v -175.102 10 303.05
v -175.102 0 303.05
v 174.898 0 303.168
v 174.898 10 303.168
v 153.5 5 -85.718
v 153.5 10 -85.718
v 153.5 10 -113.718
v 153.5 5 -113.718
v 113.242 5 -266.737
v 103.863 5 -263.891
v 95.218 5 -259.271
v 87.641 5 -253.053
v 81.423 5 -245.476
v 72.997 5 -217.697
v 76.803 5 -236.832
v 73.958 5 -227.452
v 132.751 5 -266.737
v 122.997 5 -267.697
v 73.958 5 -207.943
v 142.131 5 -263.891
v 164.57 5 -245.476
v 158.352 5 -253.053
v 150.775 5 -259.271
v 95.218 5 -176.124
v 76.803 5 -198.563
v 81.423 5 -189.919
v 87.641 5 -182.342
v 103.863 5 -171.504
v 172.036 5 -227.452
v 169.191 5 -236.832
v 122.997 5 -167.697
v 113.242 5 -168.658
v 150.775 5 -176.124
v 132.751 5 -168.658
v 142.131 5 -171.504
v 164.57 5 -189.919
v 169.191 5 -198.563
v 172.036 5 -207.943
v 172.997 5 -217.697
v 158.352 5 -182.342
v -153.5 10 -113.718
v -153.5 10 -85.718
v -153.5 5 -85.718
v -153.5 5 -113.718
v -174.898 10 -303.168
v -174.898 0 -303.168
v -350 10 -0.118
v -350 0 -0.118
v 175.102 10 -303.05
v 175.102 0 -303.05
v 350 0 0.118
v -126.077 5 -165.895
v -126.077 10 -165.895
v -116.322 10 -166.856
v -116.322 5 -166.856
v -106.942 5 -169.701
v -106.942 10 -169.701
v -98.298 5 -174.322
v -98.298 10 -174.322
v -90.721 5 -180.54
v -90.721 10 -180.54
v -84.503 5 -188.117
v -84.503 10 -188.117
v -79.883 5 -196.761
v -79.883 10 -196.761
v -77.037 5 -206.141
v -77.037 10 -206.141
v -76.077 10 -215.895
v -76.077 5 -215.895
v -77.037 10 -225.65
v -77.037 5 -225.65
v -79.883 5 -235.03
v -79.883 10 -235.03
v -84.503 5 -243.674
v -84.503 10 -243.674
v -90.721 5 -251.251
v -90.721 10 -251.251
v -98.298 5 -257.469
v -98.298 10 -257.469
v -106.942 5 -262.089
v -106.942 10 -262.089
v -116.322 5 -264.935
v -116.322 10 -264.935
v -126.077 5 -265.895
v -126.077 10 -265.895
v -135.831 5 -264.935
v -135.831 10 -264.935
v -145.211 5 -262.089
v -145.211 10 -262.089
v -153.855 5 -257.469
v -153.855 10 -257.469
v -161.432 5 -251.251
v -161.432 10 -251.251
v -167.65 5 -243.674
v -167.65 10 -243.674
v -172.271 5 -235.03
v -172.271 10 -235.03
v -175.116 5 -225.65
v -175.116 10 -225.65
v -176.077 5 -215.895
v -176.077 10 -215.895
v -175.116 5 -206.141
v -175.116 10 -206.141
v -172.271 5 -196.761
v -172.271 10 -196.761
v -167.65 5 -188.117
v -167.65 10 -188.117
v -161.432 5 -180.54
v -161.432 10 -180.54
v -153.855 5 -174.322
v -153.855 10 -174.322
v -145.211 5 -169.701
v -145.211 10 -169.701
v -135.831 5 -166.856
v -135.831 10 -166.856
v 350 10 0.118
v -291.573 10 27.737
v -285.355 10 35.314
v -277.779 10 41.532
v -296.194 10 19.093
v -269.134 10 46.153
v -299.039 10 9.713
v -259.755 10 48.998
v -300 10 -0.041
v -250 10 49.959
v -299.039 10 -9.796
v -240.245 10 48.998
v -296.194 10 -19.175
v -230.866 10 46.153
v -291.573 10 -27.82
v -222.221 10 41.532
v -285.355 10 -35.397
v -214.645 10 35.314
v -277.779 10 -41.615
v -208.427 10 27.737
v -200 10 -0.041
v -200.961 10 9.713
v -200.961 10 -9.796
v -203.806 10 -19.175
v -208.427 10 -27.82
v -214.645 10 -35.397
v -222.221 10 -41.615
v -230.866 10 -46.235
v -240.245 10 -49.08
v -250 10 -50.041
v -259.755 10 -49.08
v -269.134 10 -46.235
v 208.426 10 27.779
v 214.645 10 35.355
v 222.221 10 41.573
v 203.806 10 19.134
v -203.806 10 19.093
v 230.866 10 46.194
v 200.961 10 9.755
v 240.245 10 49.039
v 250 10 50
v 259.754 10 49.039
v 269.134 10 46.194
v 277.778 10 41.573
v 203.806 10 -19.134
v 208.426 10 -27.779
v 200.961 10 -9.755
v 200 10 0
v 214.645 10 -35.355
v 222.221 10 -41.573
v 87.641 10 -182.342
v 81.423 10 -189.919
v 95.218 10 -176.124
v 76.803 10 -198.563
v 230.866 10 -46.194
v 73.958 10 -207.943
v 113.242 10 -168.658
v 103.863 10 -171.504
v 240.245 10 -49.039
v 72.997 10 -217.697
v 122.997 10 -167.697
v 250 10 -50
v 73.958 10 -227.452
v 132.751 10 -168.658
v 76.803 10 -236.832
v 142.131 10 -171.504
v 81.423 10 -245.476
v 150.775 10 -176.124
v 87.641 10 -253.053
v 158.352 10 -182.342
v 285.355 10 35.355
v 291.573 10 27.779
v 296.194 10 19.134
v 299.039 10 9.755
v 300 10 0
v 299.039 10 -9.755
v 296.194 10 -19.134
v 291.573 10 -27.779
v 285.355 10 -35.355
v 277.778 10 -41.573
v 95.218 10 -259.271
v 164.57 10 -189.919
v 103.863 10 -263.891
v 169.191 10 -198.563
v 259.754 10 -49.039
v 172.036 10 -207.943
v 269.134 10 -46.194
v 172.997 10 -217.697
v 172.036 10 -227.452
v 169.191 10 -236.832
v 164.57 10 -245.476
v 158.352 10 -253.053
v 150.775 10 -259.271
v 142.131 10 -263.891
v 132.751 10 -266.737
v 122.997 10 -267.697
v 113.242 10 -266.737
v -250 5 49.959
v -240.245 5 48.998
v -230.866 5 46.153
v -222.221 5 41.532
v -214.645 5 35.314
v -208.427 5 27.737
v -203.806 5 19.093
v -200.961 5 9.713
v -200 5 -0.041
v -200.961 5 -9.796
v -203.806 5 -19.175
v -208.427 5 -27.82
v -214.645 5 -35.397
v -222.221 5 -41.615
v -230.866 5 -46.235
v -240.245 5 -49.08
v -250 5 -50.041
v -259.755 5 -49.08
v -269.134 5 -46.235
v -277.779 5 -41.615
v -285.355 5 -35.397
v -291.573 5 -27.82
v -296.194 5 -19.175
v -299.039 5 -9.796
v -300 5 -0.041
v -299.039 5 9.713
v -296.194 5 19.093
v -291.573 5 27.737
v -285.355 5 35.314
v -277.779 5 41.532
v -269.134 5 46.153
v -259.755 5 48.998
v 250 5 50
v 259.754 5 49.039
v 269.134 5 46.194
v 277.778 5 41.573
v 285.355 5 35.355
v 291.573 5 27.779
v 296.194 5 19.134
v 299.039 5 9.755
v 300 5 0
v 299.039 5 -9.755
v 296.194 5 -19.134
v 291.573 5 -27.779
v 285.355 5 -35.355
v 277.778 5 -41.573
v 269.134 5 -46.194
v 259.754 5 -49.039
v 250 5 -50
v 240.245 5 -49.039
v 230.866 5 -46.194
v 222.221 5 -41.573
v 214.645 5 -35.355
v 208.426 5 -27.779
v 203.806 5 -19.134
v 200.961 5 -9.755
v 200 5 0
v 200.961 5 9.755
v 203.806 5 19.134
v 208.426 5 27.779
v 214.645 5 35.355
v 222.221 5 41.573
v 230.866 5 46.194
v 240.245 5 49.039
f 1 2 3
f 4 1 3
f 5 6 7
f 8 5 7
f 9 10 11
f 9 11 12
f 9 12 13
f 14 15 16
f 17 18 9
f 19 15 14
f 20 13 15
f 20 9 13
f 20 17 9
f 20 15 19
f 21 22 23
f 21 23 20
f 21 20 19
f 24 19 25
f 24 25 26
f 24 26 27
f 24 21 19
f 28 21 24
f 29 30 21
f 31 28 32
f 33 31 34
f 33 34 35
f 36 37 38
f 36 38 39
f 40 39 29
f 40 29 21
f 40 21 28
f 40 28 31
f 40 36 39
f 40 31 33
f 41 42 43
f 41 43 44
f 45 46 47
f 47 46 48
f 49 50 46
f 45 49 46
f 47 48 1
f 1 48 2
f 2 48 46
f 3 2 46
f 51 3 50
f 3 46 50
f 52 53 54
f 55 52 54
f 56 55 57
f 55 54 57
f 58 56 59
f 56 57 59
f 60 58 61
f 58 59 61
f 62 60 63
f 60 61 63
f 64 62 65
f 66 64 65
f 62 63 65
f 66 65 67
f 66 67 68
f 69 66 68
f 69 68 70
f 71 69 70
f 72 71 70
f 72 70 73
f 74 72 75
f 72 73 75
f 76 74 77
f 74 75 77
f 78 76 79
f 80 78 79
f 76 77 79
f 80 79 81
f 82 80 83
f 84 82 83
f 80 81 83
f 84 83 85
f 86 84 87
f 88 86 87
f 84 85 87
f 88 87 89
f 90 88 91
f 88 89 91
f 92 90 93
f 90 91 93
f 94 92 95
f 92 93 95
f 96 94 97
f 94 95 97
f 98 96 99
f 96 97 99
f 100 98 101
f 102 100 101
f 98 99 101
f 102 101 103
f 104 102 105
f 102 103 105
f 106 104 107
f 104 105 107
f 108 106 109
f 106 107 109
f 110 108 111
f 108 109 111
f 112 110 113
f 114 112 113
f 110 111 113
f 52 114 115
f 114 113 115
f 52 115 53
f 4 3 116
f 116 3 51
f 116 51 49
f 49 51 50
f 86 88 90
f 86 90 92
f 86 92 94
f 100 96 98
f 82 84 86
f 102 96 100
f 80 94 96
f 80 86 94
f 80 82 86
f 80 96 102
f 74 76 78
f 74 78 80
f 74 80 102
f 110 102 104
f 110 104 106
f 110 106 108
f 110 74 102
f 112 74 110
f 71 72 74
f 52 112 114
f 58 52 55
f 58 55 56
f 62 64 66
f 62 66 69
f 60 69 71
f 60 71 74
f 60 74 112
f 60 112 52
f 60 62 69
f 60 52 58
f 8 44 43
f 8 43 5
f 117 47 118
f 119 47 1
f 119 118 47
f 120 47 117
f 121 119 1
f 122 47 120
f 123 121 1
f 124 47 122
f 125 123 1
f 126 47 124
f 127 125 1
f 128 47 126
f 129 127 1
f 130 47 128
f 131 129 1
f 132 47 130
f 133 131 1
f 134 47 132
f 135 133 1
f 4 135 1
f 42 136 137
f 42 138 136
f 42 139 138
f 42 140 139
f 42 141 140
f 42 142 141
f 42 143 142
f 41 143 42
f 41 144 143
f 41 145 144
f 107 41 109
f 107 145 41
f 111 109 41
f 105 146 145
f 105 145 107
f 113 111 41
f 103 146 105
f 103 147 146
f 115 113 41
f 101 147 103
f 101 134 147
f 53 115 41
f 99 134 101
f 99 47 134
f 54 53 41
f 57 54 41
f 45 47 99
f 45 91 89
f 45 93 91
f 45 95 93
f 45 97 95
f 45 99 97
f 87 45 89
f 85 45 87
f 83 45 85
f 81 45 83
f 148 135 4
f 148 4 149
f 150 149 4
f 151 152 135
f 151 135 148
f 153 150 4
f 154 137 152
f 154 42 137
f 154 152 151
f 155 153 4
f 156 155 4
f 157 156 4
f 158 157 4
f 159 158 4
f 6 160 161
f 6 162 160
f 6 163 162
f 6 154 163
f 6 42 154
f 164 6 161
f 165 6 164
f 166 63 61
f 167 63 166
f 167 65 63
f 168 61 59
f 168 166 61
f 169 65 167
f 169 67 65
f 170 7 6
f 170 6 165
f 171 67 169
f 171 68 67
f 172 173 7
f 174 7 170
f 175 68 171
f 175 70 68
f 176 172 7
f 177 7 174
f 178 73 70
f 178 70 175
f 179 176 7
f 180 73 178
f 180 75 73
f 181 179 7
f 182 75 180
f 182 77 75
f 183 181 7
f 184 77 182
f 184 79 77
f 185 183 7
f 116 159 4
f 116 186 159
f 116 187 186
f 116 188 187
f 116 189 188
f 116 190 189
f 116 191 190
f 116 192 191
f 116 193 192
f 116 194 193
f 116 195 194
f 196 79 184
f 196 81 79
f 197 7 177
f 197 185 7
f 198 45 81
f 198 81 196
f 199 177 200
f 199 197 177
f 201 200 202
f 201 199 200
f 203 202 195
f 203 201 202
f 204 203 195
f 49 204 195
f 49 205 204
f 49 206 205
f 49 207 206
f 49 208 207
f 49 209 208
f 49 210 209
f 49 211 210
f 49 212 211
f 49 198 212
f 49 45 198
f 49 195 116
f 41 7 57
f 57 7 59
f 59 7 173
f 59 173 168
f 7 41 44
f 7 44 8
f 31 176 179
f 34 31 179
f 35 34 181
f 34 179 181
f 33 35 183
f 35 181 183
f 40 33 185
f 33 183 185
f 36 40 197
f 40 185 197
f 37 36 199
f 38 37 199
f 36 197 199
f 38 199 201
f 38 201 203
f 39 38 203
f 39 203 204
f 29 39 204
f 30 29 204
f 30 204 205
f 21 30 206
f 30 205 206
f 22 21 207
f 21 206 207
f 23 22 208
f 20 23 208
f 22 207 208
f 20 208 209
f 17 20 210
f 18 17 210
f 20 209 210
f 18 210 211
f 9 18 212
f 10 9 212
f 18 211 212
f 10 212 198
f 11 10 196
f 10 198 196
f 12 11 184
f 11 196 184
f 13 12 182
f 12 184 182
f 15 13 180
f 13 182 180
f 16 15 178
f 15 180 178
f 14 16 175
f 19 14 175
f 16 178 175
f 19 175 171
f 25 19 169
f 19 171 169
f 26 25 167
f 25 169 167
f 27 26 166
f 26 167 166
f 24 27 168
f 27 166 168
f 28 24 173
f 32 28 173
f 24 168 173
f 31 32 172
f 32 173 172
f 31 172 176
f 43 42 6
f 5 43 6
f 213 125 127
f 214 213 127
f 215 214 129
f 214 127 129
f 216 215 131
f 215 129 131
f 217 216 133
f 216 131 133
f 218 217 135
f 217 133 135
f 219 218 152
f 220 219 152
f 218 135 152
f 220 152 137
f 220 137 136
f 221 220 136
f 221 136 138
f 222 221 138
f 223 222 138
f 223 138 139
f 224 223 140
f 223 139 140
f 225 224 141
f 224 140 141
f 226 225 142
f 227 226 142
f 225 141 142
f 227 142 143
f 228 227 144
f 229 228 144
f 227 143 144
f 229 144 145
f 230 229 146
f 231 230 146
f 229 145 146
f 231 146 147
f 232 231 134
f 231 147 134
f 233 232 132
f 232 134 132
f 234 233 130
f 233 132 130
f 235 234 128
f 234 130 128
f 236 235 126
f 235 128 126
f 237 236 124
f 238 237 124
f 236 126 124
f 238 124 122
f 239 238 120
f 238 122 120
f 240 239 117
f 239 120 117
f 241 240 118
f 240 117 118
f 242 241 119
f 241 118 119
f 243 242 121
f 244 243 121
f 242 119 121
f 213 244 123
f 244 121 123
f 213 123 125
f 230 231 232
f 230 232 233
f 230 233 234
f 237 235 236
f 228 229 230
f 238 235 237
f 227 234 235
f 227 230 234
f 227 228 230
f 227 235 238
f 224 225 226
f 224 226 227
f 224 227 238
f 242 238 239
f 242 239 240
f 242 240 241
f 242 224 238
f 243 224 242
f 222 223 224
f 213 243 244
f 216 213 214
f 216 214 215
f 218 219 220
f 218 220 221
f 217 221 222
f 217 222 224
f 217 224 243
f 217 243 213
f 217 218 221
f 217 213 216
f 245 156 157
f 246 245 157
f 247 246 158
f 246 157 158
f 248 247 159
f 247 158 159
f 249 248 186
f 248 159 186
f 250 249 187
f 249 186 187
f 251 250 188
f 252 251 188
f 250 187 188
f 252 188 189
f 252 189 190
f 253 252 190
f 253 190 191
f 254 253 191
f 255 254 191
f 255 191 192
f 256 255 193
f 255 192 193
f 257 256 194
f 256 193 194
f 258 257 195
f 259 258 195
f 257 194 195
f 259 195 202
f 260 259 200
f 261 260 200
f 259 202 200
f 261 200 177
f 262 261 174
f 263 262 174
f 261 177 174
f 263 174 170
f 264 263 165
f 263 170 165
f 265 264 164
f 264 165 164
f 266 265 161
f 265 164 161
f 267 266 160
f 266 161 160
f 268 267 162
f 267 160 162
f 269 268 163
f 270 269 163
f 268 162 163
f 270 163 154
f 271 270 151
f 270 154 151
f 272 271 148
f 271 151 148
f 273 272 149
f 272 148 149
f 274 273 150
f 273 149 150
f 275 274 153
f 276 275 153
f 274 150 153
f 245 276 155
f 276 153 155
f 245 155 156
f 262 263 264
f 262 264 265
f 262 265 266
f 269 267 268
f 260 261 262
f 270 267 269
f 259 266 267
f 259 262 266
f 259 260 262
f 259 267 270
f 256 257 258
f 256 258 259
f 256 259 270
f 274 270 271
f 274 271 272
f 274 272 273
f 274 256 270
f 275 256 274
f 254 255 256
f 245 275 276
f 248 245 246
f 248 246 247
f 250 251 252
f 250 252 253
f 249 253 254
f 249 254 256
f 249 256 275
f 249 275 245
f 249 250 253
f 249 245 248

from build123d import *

# Parameters (mm, degrees)
BOSS_EXTRUDE1_DEPTH = 10
SKETCH2_R           = 50
CUT_EXTRUDE2_DEPTH  = 5
SKETCH3_W           = 307
SKETCH3_H           = 28
CUT_EXTRUDE3_DEPTH  = 5


with BuildPart() as part:
    # Sketch1 → Boss-Extrude1 (new body)
    with BuildSketch(Plane(origin=(0, 0, 0), x_dir=(1, 0, 0), z_dir=(0, 1, 0))):
        Polygon((175.101753381, 303.050121206), (-174.898226894, 303.167627278), (-349.999980275, 0.117506072), (-175.101753381, -303.050121206), (174.898226894, -303.167627278), (349.999980275, -0.117506072), align=None)
    extrude(amount=BOSS_EXTRUDE1_DEPTH)

    # Sketch2 → Cut-Extrude2 (cut)
    with BuildSketch(Plane(origin=(0, 10, 0), x_dir=(1, 0, 0), z_dir=(0, 1, 0))):
        with Locations(Location((-250.000009417, 0.041161845, 0), (0, 0, 270))):
            Circle(SKETCH2_R)
        with Locations(Location((-126.076603066, 215.895357646, 0), (0, 0, 270))):
            Circle(SKETCH2_R)
        with Locations(Location((249.999980275, 0, 0), (0, 0, 270))):
            Circle(SKETCH2_R)
        with Locations(Location((122.996764387, 217.697498973, 0), (0, 0, 270))):
            Circle(SKETCH2_R)
    extrude(amount=-CUT_EXTRUDE2_DEPTH, mode=Mode.SUBTRACT)

    # Sketch3 → Cut-Extrude3 (cut)
    with BuildSketch(Plane(origin=(0, 10, 0), x_dir=(1, 0, 0), z_dir=(0, 1, 0))):
        with Locations((0, 99.717508168)):
            Rectangle(SKETCH3_W, SKETCH3_H)
    extrude(amount=-CUT_EXTRUDE3_DEPTH, mode=Mode.SUBTRACT)


solid = part.part
